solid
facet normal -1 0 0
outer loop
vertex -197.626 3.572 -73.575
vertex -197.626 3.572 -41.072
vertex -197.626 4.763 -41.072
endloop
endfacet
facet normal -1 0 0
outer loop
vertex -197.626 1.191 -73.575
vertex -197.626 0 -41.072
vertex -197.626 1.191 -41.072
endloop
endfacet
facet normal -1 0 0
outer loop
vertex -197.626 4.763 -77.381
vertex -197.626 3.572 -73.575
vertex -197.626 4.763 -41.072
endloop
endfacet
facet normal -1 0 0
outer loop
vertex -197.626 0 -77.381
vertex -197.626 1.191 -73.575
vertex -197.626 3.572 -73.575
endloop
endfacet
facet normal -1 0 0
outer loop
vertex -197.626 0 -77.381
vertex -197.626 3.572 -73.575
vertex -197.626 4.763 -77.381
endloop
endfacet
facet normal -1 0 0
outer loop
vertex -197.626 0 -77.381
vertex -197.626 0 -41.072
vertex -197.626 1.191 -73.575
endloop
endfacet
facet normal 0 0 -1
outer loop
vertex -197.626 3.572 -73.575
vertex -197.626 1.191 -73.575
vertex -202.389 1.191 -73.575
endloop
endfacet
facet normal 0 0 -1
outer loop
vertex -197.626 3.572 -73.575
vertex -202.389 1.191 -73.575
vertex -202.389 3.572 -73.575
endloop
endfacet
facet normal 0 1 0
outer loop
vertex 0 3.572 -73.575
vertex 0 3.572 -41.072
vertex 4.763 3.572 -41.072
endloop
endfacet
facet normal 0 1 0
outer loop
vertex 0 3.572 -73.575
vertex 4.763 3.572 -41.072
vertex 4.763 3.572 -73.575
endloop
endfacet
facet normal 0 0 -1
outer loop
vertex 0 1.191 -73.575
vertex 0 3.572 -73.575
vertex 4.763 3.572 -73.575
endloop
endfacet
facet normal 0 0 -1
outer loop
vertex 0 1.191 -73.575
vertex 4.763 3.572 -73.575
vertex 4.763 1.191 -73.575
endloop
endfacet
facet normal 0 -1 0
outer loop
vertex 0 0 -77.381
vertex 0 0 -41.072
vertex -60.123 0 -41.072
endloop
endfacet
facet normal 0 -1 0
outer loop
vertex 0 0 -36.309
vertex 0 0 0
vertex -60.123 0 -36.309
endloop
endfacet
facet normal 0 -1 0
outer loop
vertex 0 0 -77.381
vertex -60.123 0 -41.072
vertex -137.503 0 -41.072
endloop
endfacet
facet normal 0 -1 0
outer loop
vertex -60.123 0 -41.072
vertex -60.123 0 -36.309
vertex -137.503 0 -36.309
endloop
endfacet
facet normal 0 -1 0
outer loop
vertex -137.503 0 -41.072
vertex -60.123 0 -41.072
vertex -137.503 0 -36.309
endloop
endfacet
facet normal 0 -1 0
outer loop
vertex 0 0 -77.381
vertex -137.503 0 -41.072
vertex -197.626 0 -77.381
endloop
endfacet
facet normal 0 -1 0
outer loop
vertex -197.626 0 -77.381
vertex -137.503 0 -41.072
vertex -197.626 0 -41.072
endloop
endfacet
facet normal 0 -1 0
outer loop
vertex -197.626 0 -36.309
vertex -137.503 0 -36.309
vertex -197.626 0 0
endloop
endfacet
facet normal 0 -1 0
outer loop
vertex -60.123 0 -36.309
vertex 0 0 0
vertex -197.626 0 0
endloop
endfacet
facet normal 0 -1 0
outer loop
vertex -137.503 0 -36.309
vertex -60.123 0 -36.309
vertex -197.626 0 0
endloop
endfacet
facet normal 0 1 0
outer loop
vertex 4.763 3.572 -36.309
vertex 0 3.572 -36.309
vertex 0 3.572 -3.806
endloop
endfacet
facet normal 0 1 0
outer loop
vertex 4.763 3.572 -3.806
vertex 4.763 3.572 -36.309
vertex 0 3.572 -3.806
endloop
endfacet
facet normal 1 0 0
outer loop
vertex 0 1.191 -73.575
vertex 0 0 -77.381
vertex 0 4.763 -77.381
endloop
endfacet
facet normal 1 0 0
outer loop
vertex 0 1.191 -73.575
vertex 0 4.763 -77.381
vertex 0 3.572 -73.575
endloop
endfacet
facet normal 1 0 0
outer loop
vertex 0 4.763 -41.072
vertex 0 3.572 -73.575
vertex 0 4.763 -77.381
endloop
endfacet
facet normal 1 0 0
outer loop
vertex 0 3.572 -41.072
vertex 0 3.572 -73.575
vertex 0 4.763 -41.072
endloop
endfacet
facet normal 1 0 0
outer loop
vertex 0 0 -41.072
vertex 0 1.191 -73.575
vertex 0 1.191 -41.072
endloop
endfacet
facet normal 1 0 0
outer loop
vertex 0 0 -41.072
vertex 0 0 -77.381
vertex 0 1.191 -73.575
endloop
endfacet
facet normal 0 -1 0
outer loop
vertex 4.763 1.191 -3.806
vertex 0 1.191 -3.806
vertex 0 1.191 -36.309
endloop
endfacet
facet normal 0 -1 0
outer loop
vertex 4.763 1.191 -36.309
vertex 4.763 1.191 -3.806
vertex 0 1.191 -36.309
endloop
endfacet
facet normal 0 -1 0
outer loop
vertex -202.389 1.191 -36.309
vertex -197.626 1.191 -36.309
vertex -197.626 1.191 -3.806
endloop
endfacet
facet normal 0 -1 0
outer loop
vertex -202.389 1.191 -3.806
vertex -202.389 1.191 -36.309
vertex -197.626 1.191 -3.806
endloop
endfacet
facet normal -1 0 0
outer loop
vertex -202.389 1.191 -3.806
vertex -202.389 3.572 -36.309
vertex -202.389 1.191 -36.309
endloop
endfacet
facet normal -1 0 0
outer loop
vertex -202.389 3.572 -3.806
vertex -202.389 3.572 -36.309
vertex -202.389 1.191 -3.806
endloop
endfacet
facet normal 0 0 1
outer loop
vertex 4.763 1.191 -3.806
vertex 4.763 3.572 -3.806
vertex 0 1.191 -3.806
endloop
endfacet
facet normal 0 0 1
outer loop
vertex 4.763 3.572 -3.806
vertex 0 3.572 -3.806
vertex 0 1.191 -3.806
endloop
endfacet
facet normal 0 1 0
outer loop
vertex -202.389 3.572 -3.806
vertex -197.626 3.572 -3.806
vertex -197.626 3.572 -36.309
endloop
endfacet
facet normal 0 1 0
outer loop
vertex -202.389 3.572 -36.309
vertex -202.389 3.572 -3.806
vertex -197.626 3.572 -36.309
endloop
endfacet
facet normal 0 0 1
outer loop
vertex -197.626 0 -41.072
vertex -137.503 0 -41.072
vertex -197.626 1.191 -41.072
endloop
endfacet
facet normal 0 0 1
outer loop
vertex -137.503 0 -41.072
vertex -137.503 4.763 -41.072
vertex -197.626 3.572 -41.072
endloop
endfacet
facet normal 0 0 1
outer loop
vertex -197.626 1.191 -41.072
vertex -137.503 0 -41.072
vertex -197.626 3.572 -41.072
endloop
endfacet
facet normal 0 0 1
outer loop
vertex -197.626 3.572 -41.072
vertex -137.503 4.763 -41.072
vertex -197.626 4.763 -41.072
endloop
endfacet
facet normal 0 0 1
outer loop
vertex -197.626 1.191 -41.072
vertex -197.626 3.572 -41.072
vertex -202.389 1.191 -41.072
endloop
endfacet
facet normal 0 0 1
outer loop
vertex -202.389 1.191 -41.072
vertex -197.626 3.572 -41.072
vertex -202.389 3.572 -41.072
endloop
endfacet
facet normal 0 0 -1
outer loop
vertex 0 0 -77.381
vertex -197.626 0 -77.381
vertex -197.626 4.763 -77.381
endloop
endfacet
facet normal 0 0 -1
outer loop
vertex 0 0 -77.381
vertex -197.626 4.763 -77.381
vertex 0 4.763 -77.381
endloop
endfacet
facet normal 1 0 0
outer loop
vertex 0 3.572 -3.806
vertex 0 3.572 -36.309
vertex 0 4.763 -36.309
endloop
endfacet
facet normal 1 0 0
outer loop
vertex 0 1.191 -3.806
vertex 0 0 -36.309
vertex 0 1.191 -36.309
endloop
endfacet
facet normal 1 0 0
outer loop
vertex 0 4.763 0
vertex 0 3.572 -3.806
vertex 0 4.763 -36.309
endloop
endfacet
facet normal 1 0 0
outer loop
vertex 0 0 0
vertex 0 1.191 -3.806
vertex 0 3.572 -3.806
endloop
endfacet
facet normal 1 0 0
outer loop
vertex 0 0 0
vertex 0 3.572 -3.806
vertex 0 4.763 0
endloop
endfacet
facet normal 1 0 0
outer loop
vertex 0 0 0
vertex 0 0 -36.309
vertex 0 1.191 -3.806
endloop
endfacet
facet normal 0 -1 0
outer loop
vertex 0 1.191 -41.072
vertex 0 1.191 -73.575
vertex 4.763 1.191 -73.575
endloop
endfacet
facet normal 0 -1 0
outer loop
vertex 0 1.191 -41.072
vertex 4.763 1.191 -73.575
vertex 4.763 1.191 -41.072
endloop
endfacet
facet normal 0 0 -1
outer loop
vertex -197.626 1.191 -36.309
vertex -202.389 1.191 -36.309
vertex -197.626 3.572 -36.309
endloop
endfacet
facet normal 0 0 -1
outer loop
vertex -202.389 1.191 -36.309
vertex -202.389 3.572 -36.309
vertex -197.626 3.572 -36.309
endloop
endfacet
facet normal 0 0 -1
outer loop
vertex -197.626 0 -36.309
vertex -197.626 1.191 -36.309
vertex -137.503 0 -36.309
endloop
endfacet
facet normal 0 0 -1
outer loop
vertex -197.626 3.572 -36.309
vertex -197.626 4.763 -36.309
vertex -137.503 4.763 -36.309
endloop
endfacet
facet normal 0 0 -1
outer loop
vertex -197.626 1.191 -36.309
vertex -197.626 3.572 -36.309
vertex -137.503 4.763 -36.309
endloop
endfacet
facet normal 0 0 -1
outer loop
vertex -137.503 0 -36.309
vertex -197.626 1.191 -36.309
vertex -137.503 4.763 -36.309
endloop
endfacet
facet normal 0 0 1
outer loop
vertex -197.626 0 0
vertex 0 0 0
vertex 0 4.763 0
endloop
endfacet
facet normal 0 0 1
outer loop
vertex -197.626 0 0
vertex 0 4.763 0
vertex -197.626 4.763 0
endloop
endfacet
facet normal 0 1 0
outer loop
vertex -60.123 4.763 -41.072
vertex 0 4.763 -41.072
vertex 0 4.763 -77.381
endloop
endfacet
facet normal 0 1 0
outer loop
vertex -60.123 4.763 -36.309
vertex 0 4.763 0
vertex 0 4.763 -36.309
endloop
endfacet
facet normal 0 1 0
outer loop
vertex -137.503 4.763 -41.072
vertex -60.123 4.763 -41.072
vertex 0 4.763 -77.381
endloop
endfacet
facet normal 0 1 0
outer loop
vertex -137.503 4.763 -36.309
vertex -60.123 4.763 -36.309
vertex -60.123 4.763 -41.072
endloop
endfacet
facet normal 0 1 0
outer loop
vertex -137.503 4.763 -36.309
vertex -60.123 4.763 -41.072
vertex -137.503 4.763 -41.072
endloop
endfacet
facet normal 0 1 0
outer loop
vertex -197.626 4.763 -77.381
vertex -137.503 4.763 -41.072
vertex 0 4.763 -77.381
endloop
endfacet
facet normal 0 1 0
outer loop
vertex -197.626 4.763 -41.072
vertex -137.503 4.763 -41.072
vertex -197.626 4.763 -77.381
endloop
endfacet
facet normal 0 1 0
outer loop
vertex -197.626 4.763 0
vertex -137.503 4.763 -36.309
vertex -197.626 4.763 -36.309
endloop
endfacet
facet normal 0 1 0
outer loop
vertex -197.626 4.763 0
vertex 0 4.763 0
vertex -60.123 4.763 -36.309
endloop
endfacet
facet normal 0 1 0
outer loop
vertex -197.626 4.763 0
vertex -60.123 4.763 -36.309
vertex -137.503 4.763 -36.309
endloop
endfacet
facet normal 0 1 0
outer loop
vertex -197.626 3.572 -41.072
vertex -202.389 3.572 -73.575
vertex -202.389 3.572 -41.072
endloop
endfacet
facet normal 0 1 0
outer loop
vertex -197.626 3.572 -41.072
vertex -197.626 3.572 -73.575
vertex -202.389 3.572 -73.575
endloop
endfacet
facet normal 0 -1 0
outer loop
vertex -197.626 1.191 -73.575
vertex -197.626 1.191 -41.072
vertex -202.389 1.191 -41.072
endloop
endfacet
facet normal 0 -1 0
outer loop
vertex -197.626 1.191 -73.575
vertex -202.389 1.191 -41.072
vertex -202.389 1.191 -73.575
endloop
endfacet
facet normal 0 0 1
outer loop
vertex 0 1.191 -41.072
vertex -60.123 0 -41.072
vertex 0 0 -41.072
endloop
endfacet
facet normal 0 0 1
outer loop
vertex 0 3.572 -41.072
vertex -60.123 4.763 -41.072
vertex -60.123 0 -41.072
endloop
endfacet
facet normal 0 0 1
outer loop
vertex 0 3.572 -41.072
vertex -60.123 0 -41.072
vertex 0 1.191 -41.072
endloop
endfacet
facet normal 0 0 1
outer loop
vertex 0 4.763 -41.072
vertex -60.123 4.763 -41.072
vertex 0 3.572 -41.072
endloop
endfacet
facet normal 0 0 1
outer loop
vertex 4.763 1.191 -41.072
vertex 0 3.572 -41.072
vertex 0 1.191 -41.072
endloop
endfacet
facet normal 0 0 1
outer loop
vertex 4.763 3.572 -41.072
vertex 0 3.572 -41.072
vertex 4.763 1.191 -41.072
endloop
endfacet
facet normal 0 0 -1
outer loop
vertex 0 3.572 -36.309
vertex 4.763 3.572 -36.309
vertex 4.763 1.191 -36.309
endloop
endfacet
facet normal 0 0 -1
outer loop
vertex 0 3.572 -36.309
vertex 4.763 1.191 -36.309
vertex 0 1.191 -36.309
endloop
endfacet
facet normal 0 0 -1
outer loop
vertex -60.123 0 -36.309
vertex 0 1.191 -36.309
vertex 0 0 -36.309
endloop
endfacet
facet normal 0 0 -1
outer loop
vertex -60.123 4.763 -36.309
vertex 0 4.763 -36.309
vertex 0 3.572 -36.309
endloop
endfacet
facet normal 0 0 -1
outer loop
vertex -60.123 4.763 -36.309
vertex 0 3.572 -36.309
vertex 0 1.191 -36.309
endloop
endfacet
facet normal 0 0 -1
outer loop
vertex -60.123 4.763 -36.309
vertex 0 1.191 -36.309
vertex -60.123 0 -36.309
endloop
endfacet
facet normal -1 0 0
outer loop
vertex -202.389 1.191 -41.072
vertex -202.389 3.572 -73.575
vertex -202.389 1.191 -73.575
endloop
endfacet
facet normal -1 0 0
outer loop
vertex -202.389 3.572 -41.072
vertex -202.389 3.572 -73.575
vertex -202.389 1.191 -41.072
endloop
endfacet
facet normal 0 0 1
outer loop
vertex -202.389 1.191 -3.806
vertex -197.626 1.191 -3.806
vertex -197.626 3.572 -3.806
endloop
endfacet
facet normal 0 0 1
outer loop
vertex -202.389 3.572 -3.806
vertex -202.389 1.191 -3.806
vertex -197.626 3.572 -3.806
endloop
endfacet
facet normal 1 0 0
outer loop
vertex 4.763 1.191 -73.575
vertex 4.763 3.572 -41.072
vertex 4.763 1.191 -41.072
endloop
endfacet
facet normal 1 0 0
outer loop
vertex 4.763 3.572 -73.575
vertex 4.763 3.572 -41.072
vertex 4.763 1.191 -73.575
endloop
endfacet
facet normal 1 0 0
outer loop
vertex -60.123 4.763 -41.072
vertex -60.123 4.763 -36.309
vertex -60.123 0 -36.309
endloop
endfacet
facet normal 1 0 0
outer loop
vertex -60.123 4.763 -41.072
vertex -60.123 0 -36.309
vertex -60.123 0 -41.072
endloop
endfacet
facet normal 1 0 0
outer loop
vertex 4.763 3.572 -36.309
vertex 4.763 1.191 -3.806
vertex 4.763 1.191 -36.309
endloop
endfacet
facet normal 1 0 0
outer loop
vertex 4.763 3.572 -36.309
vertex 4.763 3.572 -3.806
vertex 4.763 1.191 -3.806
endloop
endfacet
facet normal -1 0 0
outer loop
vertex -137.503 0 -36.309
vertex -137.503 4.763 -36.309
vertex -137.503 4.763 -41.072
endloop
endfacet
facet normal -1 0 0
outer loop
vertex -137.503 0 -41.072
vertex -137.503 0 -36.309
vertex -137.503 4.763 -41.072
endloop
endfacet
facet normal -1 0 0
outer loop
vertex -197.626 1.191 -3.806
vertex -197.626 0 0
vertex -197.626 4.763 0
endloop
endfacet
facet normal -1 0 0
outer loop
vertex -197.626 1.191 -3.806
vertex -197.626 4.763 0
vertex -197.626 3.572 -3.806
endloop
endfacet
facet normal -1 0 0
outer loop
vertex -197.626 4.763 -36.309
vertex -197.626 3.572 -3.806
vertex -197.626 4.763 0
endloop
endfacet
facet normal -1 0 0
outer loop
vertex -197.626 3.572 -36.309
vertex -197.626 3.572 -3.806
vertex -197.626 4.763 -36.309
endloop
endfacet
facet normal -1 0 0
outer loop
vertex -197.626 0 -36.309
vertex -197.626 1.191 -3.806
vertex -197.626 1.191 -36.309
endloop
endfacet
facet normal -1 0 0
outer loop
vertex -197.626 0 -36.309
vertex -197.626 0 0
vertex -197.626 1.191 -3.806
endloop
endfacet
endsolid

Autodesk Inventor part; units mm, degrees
ref_plane "YZ Plane" through (0, 0, 0) normal (1, 0, 0) x (0, 1, 0)
ref_plane "XZ Plane" through (0, 0, 0) normal (0, 1, 0) x (-1, 0, 0)
sketch "Sketch1" plane through (0, 0, 0) normal (0, 1, 0) x (-1, 0, 0)
  line L0 (0, 0) -> (197.626, 0)
  line L1 (197.626, 0) -> (197.626, -77.381)
  line L2 (197.626, -77.381) -> (0, -77.381)
  line L3 (0, -77.381) -> (0, 0)
  dimension "d0" = 197.626
  dimension "d1" = 77.381
extrude "Extrusion1" add sketch "Sketch1" along normal blind 4.763
sketch "Sketch2" plane through (0, 4.763, 0) normal (0, 1, 0) x (1, 0, 0)
  line L0 (0, 41.072) -> (0, 36.309)
  line L1 (0, 36.309) -> (-60.123, 36.309)
  line L2 (-60.123, 36.309) -> (-60.123, 41.072)
  line L3 (-60.123, 41.072) -> (0, 41.072)
  line L4 (-197.626, 41.072) -> (-197.626, 36.309)
  line L5 (-197.626, 36.309) -> (-137.503, 36.309)
  line L6 (-137.503, 36.309) -> (-137.503, 41.072)
  line L7 (-137.503, 41.072) -> (-197.626, 41.072)
  dimension "d6" = 4.763
  dimension "d7" = 60.123
extrude "Extrusion2" cut sketch "Sketch2" against normal blind 22
sketch "Sketch3" plane through (0, 0, 0) normal (1, 0, 0) x (0, 0, -1)
  line L0 (36.309, 3.572) -> (3.806, 3.572)
  line L1 (3.806, 3.572) -> (3.806, 1.191)
  line L2 (3.806, 1.191) -> (36.309, 1.191)
  line L3 (36.309, 3.572) -> (36.309, 1.191)
  line L4 (41.072, 3.572) -> (73.575, 3.572)
  line L5 (73.575, 3.572) -> (73.575, 1.191)
  line L6 (73.575, 1.191) -> (41.072, 1.191)
  line L7 (41.072, 3.572) -> (41.072, 1.191)
  dimension "d12" = 32.503
extrude "Extrusion3" add sketch "Sketch3" along normal blind 4.763
ref_plane "Work Plane1" through (-98.813, 0, 0) normal (1, 0, 0) x (0, 0, -1)
mirror "Mirror1" about plane through (-98.813, 0, 0) normal (1, 0, 0) of "Extrusion3"
properties part number "Sustainable Chair_V4 - Lateral Support" material "Foam Board - V3"
